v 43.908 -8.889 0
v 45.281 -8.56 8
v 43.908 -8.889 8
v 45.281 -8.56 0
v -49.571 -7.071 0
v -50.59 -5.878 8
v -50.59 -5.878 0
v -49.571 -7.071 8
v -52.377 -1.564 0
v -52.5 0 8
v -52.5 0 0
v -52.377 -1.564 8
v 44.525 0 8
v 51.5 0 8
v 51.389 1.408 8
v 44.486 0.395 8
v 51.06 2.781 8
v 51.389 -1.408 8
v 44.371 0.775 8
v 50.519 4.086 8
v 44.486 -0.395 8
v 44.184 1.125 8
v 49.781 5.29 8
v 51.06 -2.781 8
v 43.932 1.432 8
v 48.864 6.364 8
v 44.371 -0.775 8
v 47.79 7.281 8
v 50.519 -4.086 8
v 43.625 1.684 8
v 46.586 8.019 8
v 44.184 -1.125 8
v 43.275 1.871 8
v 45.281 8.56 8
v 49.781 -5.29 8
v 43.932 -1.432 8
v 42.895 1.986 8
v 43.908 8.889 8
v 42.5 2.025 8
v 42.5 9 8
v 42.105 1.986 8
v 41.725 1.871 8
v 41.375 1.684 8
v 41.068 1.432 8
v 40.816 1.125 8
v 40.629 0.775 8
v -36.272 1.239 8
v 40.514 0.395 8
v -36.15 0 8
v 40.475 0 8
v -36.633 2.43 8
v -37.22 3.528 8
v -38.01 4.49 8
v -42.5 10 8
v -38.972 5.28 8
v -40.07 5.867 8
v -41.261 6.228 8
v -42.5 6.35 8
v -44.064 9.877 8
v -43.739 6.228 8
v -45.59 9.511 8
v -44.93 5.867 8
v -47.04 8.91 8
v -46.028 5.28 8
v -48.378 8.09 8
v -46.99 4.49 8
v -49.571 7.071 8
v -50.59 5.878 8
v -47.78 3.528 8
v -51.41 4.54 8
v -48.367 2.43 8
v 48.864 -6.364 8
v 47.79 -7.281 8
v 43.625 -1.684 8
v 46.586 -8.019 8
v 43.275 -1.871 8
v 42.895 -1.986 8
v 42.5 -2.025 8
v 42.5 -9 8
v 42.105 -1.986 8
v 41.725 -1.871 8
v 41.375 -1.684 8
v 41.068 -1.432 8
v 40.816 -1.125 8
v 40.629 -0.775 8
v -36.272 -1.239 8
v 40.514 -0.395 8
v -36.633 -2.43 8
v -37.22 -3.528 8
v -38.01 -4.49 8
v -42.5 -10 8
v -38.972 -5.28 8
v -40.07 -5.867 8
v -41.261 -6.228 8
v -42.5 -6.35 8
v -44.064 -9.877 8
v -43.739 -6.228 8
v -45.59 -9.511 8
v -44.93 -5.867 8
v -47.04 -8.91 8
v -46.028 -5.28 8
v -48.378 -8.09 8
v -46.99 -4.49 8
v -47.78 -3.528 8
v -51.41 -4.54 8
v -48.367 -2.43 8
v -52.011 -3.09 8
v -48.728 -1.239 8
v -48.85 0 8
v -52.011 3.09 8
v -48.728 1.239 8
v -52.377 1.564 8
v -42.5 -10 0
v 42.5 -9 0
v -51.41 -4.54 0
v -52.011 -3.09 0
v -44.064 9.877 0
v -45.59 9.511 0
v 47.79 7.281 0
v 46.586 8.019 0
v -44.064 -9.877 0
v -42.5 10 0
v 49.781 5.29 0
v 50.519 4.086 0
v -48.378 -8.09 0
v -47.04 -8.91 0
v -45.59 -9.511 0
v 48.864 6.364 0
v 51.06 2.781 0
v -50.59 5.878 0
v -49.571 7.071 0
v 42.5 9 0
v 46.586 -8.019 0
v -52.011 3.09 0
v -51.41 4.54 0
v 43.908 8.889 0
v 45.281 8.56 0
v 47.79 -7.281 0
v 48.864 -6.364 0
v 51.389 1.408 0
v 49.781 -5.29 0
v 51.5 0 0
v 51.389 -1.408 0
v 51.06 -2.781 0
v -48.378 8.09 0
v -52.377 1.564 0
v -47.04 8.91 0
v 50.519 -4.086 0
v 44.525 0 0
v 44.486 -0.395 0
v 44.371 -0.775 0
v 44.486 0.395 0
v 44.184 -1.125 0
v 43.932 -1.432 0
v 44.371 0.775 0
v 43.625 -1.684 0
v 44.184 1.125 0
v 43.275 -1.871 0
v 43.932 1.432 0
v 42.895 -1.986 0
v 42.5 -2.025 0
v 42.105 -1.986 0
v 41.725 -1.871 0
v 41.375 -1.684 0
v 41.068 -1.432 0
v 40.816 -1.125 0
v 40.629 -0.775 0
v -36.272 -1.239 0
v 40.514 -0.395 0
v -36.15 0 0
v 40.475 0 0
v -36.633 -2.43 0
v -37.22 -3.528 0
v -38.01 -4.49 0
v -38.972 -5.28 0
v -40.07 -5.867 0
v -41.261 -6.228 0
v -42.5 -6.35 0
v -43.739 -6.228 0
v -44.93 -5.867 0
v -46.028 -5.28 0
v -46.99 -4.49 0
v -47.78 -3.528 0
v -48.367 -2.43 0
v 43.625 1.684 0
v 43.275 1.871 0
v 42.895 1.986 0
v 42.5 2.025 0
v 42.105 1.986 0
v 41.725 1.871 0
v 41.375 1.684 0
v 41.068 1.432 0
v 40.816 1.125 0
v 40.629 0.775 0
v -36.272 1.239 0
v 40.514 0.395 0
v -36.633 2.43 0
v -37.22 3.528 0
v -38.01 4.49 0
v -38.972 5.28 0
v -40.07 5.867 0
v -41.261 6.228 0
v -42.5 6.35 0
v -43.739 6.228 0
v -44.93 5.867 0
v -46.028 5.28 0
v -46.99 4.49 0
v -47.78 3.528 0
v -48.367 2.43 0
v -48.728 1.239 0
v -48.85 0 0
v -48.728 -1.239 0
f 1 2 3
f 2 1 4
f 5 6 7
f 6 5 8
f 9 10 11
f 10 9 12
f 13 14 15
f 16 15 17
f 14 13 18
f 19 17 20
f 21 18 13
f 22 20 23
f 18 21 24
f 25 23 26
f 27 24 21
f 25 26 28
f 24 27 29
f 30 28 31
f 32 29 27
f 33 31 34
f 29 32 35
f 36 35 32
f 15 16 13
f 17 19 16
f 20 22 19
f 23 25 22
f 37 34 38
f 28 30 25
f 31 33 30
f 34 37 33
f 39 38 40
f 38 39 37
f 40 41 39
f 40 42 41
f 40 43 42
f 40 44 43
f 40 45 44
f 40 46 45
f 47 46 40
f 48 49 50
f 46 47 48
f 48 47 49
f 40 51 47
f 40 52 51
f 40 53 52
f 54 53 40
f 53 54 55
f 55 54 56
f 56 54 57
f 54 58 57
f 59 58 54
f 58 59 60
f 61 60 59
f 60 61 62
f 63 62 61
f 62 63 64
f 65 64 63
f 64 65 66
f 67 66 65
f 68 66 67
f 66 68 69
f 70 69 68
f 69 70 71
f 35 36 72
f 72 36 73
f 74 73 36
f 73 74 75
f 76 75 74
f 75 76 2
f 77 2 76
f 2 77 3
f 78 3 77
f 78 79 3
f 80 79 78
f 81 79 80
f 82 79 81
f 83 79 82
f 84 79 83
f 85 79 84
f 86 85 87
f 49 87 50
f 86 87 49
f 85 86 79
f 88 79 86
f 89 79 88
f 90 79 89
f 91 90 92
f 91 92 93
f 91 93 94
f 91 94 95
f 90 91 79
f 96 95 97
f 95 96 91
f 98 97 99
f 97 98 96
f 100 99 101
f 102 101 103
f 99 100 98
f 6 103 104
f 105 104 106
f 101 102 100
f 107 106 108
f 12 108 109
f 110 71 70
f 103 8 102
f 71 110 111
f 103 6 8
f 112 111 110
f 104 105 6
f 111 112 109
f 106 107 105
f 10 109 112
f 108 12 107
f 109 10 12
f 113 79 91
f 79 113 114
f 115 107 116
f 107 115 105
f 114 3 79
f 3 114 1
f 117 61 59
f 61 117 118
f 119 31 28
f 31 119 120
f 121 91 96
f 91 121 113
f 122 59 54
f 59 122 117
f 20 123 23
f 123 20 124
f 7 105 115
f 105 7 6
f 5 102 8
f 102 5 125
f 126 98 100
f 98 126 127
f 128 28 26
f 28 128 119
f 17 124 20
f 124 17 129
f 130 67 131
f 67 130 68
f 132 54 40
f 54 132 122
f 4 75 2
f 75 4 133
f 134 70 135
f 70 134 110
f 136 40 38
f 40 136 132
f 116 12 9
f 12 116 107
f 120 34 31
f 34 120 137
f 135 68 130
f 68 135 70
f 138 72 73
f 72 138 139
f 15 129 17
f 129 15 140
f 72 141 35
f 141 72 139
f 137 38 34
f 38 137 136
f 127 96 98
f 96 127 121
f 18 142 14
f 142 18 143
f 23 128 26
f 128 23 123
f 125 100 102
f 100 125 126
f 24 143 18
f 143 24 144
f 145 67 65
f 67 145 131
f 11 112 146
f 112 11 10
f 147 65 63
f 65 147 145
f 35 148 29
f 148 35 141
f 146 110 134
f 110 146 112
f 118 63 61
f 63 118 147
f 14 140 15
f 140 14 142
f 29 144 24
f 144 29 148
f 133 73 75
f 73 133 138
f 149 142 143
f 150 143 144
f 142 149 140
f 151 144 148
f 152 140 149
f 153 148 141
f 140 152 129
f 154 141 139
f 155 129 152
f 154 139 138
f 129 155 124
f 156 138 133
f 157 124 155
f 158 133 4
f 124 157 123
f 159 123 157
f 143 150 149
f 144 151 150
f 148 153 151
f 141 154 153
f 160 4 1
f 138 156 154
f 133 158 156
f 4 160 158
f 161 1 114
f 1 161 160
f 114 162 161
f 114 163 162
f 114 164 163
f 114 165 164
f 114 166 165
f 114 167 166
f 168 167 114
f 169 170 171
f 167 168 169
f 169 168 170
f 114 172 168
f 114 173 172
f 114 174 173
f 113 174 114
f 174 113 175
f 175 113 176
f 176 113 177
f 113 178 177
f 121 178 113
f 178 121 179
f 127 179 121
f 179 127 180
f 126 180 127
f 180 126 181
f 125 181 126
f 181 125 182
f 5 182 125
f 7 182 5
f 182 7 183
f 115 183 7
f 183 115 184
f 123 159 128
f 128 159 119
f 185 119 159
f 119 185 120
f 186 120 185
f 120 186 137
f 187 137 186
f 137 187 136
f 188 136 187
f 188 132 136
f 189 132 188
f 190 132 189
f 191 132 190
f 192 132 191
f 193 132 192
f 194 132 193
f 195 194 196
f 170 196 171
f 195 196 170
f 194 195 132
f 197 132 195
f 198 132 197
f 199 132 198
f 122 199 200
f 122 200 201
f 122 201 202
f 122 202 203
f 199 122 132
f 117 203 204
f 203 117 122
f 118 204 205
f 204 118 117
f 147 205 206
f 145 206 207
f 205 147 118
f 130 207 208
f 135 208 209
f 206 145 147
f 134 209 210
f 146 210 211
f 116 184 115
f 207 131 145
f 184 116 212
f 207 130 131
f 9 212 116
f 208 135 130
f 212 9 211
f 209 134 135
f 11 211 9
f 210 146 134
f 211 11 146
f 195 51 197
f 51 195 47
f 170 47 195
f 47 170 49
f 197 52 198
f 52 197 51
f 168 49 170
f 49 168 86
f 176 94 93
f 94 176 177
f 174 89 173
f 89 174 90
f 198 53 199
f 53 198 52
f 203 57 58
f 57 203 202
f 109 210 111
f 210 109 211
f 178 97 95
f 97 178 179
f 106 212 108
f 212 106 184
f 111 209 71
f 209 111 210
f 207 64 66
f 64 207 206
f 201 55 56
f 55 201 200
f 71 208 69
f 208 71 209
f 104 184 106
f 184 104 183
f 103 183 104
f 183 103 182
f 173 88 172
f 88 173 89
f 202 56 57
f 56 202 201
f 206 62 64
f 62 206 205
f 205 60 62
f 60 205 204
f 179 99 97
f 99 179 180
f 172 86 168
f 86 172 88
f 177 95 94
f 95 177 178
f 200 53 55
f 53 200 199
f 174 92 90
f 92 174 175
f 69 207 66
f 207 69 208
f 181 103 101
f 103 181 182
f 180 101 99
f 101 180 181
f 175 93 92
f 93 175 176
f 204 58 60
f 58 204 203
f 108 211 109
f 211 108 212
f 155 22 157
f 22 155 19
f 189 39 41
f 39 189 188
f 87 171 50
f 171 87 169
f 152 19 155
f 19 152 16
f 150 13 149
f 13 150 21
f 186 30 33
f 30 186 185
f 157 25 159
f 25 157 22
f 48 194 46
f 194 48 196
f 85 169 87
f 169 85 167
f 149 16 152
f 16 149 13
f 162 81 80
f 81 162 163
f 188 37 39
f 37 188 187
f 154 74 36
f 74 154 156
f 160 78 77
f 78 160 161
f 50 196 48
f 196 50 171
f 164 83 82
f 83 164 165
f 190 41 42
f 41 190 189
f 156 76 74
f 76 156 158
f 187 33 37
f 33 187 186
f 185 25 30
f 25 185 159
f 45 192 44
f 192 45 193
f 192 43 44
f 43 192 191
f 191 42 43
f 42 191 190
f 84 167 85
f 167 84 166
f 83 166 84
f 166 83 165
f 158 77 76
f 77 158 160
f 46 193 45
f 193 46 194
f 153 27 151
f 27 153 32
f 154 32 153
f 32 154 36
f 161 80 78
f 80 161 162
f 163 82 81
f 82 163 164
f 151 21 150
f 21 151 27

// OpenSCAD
$fn = 32;

// ----------------------------------------------------------------------
// Lever: 85 mm between the bosses, 8 mm thick, smooth outline
// ----------------------------------------------------------------------

// --- parameters (mm) ---
lever_l = 85;             // distance between the boss centres
boss_a = 20;              // first boss diameter
boss_b = 18;              // second boss diameter
bore_a = 12.7;            // first bore
bore_b = 4.05;            // second bore
lever_t = 8;              // lever thickness

lever_profile = [[-52.5, 0], [-52.377, -1.564], [-52.011, -3.09], [-51.41, -4.54], [-50.59, -5.878], [-49.571, -7.071], [-48.378, -8.09], [-47.04, -8.91], [-45.59, -9.511], [-44.064, -9.877], [-42.5, -10], [42.5, -9], [43.908, -8.889], [45.281, -8.56], [46.586, -8.019], [47.79, -7.281], [48.864, -6.364], [49.781, -5.29], [50.519, -4.086], [51.06, -2.781], [51.389, -1.408], [51.5, 0], [51.389, 1.408], [51.06, 2.781], [50.519, 4.086], [49.781, 5.29], [48.864, 6.364], [47.79, 7.281], [46.586, 8.019], [45.281, 8.56], [43.908, 8.889], [42.5, 9], [-42.5, 10], [-44.064, 9.877], [-45.59, 9.511], [-47.04, 8.91], [-48.378, 8.09], [-49.571, 7.071], [-50.59, 5.878], [-51.41, 4.54], [-52.011, 3.09], [-52.377, 1.564]];

difference() {
  linear_extrude(height = lever_t) polygon(lever_profile);
  translate([-42.5, 0, -2.5]) cylinder(h = lever_t + 5, d = bore_a);
  translate([42.5, 0, -2.5]) cylinder(h = lever_t + 5, d = bore_b);
}
